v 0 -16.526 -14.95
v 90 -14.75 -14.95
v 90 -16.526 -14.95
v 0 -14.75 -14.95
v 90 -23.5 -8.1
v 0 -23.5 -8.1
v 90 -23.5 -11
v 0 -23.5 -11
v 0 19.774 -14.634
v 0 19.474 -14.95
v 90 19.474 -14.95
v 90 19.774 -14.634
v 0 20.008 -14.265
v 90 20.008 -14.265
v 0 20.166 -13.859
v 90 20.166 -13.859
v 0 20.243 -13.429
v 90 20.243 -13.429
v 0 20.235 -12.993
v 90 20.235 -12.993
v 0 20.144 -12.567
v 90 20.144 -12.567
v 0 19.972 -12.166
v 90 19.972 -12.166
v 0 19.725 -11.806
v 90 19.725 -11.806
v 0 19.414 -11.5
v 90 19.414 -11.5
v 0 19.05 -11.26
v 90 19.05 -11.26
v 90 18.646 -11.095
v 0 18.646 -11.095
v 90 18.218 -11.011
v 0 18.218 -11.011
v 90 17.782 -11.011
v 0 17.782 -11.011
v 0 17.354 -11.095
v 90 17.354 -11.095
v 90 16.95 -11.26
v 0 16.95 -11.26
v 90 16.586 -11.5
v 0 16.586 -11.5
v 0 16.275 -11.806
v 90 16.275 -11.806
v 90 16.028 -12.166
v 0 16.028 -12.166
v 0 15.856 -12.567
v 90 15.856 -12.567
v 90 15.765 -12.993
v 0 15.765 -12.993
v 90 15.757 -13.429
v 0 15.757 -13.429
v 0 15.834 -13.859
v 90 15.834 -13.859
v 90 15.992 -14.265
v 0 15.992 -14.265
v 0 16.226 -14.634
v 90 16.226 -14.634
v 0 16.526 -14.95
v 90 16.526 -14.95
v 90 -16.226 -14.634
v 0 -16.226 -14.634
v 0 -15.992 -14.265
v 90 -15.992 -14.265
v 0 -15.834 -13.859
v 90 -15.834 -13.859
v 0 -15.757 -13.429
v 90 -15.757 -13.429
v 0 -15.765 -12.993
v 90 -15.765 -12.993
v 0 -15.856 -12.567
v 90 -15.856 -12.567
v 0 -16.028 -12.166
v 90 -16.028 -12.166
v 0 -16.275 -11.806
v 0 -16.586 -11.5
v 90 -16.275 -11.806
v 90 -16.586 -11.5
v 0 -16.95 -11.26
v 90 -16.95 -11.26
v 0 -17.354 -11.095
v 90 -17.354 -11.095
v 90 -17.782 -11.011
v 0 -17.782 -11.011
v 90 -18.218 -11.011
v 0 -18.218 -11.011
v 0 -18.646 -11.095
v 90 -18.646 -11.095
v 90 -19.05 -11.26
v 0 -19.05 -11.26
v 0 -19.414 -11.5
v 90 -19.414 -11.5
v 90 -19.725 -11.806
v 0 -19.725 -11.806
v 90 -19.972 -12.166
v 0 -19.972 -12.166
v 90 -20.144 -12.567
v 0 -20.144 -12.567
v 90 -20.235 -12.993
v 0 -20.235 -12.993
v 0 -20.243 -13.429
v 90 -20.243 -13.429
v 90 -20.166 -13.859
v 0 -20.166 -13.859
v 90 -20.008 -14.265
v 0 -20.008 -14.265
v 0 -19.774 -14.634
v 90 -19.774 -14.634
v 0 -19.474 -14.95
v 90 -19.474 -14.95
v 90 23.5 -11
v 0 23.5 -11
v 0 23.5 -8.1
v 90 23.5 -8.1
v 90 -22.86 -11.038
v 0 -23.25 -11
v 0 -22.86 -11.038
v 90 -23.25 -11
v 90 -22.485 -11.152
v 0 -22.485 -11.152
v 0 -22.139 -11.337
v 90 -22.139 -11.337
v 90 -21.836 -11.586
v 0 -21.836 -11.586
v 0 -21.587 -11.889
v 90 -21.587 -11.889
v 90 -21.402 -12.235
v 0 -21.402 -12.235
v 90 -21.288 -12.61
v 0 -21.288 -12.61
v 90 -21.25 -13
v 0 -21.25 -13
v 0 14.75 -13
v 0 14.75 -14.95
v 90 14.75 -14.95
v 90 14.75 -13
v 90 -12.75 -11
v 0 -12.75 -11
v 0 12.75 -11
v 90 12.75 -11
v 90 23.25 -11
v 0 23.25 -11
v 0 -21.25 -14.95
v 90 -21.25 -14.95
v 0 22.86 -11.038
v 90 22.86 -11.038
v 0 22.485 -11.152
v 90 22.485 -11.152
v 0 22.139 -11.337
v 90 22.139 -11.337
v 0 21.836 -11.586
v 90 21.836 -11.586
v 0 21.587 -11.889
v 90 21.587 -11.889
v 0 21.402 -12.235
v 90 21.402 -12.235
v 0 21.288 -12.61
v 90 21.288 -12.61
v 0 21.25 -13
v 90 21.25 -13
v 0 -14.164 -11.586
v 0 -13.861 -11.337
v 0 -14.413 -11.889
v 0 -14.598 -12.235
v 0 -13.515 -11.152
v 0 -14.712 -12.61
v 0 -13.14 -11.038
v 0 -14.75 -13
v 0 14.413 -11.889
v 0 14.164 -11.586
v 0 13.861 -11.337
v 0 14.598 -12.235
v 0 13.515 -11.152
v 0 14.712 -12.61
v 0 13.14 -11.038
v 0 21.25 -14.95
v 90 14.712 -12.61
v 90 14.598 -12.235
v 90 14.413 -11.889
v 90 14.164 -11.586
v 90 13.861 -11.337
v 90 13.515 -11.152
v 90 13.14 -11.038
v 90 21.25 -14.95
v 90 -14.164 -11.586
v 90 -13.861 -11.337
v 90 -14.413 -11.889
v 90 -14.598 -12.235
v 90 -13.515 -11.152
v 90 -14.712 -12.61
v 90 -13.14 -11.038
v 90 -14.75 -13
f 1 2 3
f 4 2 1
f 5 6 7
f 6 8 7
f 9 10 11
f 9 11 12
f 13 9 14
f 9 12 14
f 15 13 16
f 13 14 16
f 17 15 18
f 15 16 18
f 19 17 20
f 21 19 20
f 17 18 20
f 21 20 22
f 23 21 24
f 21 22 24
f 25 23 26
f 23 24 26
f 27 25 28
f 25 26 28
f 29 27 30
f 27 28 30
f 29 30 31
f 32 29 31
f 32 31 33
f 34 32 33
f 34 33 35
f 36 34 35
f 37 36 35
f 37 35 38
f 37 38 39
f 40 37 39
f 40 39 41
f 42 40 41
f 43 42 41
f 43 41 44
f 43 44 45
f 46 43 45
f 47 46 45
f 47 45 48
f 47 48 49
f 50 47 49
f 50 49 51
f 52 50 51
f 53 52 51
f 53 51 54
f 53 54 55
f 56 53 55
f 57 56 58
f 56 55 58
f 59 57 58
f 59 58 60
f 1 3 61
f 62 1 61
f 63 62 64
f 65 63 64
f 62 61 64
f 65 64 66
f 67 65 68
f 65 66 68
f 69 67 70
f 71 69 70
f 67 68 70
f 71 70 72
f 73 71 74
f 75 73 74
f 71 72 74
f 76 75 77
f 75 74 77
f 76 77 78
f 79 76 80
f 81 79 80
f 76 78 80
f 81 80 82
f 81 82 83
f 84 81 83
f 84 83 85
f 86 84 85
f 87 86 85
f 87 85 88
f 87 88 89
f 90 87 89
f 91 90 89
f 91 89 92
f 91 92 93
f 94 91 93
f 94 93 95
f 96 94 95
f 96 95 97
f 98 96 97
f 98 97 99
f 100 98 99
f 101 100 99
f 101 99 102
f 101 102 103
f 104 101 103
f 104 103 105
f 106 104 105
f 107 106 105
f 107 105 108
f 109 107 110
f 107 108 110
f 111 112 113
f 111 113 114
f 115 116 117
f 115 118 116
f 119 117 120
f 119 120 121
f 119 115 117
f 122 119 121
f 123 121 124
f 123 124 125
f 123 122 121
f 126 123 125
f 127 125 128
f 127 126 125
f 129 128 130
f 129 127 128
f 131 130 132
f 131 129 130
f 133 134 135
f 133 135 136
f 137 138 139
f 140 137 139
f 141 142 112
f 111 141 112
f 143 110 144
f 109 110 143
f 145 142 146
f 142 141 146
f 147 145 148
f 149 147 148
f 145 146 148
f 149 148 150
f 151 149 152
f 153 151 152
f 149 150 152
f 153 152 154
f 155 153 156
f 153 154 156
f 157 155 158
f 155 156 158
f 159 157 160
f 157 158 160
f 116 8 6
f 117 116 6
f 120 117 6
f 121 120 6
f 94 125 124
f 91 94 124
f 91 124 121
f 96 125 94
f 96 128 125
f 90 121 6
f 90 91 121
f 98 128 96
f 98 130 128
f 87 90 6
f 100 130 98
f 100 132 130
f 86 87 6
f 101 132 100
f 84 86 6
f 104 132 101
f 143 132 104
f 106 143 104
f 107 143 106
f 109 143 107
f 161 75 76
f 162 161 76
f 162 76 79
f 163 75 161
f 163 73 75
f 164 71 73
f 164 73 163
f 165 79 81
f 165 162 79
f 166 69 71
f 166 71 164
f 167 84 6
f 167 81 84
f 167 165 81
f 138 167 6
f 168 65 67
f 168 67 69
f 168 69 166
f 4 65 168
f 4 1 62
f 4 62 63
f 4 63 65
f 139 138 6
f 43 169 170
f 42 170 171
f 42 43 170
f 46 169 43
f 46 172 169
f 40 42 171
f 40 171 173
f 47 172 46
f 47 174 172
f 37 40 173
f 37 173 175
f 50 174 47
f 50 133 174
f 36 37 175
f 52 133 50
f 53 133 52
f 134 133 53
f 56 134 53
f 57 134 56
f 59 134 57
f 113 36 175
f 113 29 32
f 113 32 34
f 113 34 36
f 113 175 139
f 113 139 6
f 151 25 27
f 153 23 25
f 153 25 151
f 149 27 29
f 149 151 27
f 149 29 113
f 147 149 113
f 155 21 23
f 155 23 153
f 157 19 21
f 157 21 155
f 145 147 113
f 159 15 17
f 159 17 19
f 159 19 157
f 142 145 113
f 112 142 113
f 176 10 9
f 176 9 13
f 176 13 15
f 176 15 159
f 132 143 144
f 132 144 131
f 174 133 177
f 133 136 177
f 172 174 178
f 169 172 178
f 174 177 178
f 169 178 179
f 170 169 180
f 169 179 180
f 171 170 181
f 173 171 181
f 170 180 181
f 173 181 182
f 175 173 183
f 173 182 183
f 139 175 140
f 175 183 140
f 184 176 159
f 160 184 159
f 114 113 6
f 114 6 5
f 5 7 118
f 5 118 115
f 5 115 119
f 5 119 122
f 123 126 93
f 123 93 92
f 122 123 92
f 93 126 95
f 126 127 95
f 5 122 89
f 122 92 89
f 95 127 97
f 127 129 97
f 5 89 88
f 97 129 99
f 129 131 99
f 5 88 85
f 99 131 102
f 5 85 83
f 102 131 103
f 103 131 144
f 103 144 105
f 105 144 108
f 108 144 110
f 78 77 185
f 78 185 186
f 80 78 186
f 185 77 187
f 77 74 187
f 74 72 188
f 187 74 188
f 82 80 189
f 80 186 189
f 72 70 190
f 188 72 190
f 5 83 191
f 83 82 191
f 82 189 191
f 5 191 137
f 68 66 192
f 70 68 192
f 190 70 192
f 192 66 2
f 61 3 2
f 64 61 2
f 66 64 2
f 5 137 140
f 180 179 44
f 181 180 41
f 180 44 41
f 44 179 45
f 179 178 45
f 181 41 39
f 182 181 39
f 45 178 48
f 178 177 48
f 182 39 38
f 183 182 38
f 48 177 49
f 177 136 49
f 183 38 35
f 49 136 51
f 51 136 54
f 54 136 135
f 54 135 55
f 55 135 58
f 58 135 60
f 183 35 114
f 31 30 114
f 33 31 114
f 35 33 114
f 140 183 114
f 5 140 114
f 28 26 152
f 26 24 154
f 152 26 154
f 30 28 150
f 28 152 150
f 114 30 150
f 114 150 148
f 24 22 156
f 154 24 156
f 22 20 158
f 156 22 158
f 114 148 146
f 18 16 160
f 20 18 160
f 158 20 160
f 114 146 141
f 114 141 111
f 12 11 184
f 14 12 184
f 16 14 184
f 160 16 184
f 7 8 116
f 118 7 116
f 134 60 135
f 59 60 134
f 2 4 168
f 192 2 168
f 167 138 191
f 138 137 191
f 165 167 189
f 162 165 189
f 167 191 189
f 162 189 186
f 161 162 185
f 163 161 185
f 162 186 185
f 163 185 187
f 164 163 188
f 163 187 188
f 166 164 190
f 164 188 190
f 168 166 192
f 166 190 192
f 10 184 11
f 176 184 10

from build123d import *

# Parameters (mm, degrees)
EXTRUDE_1_DEPTH             = 90
SKETCH_2_W                  = 90
SKETCH_2_H                  = 17.75
EXTRUDE_2_DEPTH             = 8.2
SKETCH_3_W                  = 90
SKETCH_3_H                  = 50.95
EXTRUDE_3_DEPTH             = 8.2
SKETCH_4_W                  = 3.95
SKETCH_4_H                  = 29.5
CUT_EXTRUDE_1_DEPTH         = 96.44153315
SKETCH_5_W                  = 3.95
SKETCH_5_H                  = 6.2
CUT_EXTRUDE_2_DEPTH         = 96.44153315
SKETCH_6_W                  = 2.25
SKETCH_6_H                  = 3.95
CUT_EXTRUDE_3_DEPTH         = 96.44153315
SKETCH_7_W                  = 4.5
SKETCH_7_H                  = 3.95
CUT_EXTRUDE_4_DEPTH         = 96.44153315
SKETCH_8_W                  = 2.25
SKETCH_8_H                  = 3.95
CUT_EXTRUDE_5_DEPTH         = 96.44153315
SKETCH_9_W                  = 3.95
SKETCH_9_H                  = 2.25
CUT_EXTRUDE_6_DEPTH         = 96.44153315
SKETCH_10_W                 = 20.2
SKETCH_10_H                 = 45.2
CUT_EXTRUDE_7_DEPTH         = 86
HOLE_WIZARD_2_5_2_5_1_D     = 2.5
HOLE_WIZARD_4_5_4_5_1_D     = 4.5
HOLE_WIZARD_8_3_8_3_1_D     = 8.3
HOLE_WIZARD_8_3_8_3_1_DEPTH = 3.2
FILLET_1_R                  = 2
FILLET_2_R                  = 2
EXTRUDE_START               = -90
SKETCH_17_R                 = 1.25
EXTRUDE_4_DEPTH             = 90
CUT_EXTRUDE_START           = -100
SKETCH_18_R                 = 4.15
CUT_EXTRUDE_8_DEPTH         = 100
CUT_EXTRUDE_9_DEPTH         = 110
CUT_EXTRUDE_10_DEPTH        = 110
SKETCH_21_W                 = 90
SKETCH_21_H                 = 47
EXTRUDE_5_DEPTH             = 2


with BuildPart() as part:
    # Эскиз1 → Бобышка-Вытянуть1 (new body)
    with BuildSketch(Plane(origin=(90, 0, 0), x_dir=(0, 0, -1), z_dir=(1, 0, 0))):
        with BuildLine():
            Line((6.75, -24.093761792), (6.75, 19.25))
            Line((6.75, 19.25), (-11.593761792, 19.25))
            ThreePointArc((-11.593761792, 19.25), (-15.325, 18), (-11.593761792, 16.75))
            Line((-11.593761792, 16.75), (-11, 16.75))
            Line((-11, 16.75), (-11, -16.75))
            Line((-11, -16.75), (-11.593761792, -16.75))
            ThreePointArc((-11.593761792, -16.75), (-15.325, -18), (-11.593761792, -19.25))
            Line((-11.593761792, -19.25), (-11, -19.25))
            Line((-11, -19.25), (-11, -23.5))
            Line((-11, -23.5), (-6.75, -23.5))
            Line((-6.75, -23.5), (-6.75, -24.093761792))
            ThreePointArc((-6.75, -24.093761792), (-5.5, -27.825), (-4.25, -24.093761792))
            Line((-4.25, -24.093761792), (-4.25, -23.5))
            Line((-4.25, -23.5), (4.25, -23.5))
            Line((4.25, -23.5), (4.25, -24.093761792))
            ThreePointArc((4.25, -24.093761792), (5.5, -27.825), (6.75, -24.093761792))
        make_face()
    extrude(amount=-EXTRUDE_1_DEPTH)

    # Эскиз2 → Бобышка-Вытянуть2 (add)
    with BuildSketch(Plane(origin=(0, 19.25, 0), x_dir=(-1, 0, 0), z_dir=(0, 1, 0))):
        with Locations((-45, 2.125)):
            Rectangle(SKETCH_2_W, SKETCH_2_H)
    extrude(amount=EXTRUDE_2_DEPTH)

    # Эскиз3 → Бобышка-Вытянуть3 (add)
    with BuildSketch(Plane(origin=(0, 0, -6.75), x_dir=(-1, 0, 0), z_dir=(0, 0, -1))):
        with Locations((-45, 1.975)):
            Rectangle(SKETCH_3_W, SKETCH_3_H)
    extrude(amount=EXTRUDE_3_DEPTH)

    # Эскиз4 → Вырез-Вытянуть1 (cut, through all)
    with BuildSketch(Plane.ZY):
        with Locations((-12.975, 0)):
            Rectangle(SKETCH_4_W, SKETCH_4_H)
    extrude(amount=-CUT_EXTRUDE_1_DEPTH, mode=Mode.SUBTRACT)

    # Эскиз5 → Вырез-Вытянуть2 (cut, through all)
    with BuildSketch(Plane.ZY):
        with Locations((-12.975, 24.35)):
            Rectangle(SKETCH_5_W, SKETCH_5_H)
    extrude(amount=-CUT_EXTRUDE_2_DEPTH, mode=Mode.SUBTRACT)

    # Эскиз6 → Вырез-Вытянуть3 (cut, through all)
    with BuildSketch(Plane.ZY):
        with Locations((-9.875, 25.475)):
            Rectangle(SKETCH_6_W, SKETCH_6_H)
    extrude(amount=-CUT_EXTRUDE_3_DEPTH, mode=Mode.SUBTRACT)

    # Эскиз7 → Вырез-Вытянуть4 (cut, through all)
    with BuildSketch(Plane.ZY):
        with Locations((0, 25.475)):
            Rectangle(SKETCH_7_W, SKETCH_7_H)
    extrude(amount=-CUT_EXTRUDE_4_DEPTH, mode=Mode.SUBTRACT)

    # Эскиз8 → Вырез-Вытянуть5 (cut, through all)
    with BuildSketch(Plane.ZY):
        with Locations((9.875, 25.475)):
            Rectangle(SKETCH_8_W, SKETCH_8_H)
    extrude(amount=-CUT_EXTRUDE_5_DEPTH, mode=Mode.SUBTRACT)

    # Эскиз9 → Вырез-Вытянуть6 (cut, through all)
    with BuildSketch(Plane.ZY):
        with Locations((-12.975, -22.375)):
            Rectangle(SKETCH_9_W, SKETCH_9_H)
    extrude(amount=-CUT_EXTRUDE_6_DEPTH, mode=Mode.SUBTRACT)

    # Эскиз10 → Вырез-Вытянуть7 (cut)
    with BuildSketch(Plane(origin=(90, 0, 0), x_dir=(0, 0, -1), z_dir=(1, 0, 0))):
        Rectangle(SKETCH_10_W, SKETCH_10_H)
    extrude(amount=-CUT_EXTRUDE_7_DEPTH, mode=Mode.SUBTRACT)

    # Диаметр отверстия Ø2.5 (2.5)1 (through all)
    with Locations(Plane(origin=(90, 0, 0), x_dir=(0, 0, -1), z_dir=(1, 0, 0))):
        with Locations((5.5, -25.75), (-13.25, -18), (-5.5, -25.75), (-13.25, 18)):
            Hole(HOLE_WIZARD_2_5_2_5_1_D / 2)

    # Диаметр отверстия Ø4.5 (4.5)1 (through all)
    with Locations(Plane.ZY):
        with Locations((-13.25, -18), (-13.25, 18), (-5.5, 25.75), (5.5, 25.75)):
            Hole(HOLE_WIZARD_4_5_4_5_1_D / 2)

    # Диаметр отверстия Ø8.3 (8.3)1
    with Locations(Plane.ZY):
        with Locations((0, 0)):
            Hole(HOLE_WIZARD_8_3_8_3_1_D / 2, depth=HOLE_WIZARD_8_3_8_3_1_DEPTH)

    # Скругление1
    fillet_1_edges = [part.edges().sort_by_distance(p)[0] for p in [
        (45, 23.5, 8.75),
    ]]
    fillet(fillet_1_edges, radius=FILLET_1_R)

    # Скругление2
    fillet_2_edges = [part.edges().sort_by_distance(p)[0] for p in [
        (45, 23.5, -8.75),
        (45, 23.5, 2.25),
        (45, 23.5, -2.25),
        (45, -21.25, -11),
        (4, 0, -10.1),
        (4, -22.6, 0),
        (4, 0, 10.1),
        (4, 22.6, 0),
        (45, 14.75, -11),
        (45, -14.75, -11),
        (45, 21.25, -11),
    ]]
    fillet(fillet_2_edges, radius=FILLET_2_R)

    # Эскиз17 → Бобышка-Вытянуть4 (add)
    with BuildSketch(Plane(origin=(90, 0, 0), x_dir=(0, 0, -1), z_dir=(1, 0, 0)).offset(EXTRUDE_START)):
        with Locations((5.5, -25.75)):
            Circle(SKETCH_17_R)
        with Locations((-5.5, -25.75)):
            Circle(SKETCH_17_R)
        with Locations((-13.25, -18)):
            Circle(SKETCH_17_R)
        with Locations((-13.25, 18)):
            Circle(SKETCH_17_R)
    extrude(amount=EXTRUDE_4_DEPTH)

    # Эскиз18 → Вырез-Вытянуть8 (cut)
    with BuildSketch(Plane.ZY.offset(CUT_EXTRUDE_START)):
        Circle(SKETCH_18_R)
    extrude(amount=CUT_EXTRUDE_8_DEPTH, mode=Mode.SUBTRACT)

    # Эскиз19 → Вырез-Вытянуть9 (cut)
    with BuildSketch(Plane(origin=(90, 0, 0), x_dir=(0, 0, -1), z_dir=(1, 0, 0))):
        Polygon((10.1, -22.6), (10.1, 22.6), (10.1, 31.019338608), (-21.722605493, 31.019338608), (-21.722605493, -29.745467662), (10.1, -29.745467662), align=None)
    extrude(amount=-CUT_EXTRUDE_9_DEPTH, mode=Mode.SUBTRACT)

    # Эскиз20 → Вырез-Вытянуть10 (cut)
    with BuildSketch(Plane(origin=(90, 0, 0), x_dir=(0, 0, -1), z_dir=(1, 0, 0))):
        with BuildLine():
            Line((10.1, 23.5), (10.1, 23.608571968))
            ThreePointArc((10.1, 23.608571968), (10.420497393, 23.52732972), (10.75, 23.5))
            Line((10.75, 23.5), (10.1, 23.5))
        make_face()
    extrude(amount=-CUT_EXTRUDE_10_DEPTH, mode=Mode.SUBTRACT)

    # Эскиз21 → Бобышка-Вытянуть5 (add)
    with BuildSketch(Plane.XY.offset(-10.1)):
        with Locations((45, 0)):
            Rectangle(SKETCH_21_W, SKETCH_21_H)
    extrude(amount=EXTRUDE_5_DEPTH)


solid = part.part
